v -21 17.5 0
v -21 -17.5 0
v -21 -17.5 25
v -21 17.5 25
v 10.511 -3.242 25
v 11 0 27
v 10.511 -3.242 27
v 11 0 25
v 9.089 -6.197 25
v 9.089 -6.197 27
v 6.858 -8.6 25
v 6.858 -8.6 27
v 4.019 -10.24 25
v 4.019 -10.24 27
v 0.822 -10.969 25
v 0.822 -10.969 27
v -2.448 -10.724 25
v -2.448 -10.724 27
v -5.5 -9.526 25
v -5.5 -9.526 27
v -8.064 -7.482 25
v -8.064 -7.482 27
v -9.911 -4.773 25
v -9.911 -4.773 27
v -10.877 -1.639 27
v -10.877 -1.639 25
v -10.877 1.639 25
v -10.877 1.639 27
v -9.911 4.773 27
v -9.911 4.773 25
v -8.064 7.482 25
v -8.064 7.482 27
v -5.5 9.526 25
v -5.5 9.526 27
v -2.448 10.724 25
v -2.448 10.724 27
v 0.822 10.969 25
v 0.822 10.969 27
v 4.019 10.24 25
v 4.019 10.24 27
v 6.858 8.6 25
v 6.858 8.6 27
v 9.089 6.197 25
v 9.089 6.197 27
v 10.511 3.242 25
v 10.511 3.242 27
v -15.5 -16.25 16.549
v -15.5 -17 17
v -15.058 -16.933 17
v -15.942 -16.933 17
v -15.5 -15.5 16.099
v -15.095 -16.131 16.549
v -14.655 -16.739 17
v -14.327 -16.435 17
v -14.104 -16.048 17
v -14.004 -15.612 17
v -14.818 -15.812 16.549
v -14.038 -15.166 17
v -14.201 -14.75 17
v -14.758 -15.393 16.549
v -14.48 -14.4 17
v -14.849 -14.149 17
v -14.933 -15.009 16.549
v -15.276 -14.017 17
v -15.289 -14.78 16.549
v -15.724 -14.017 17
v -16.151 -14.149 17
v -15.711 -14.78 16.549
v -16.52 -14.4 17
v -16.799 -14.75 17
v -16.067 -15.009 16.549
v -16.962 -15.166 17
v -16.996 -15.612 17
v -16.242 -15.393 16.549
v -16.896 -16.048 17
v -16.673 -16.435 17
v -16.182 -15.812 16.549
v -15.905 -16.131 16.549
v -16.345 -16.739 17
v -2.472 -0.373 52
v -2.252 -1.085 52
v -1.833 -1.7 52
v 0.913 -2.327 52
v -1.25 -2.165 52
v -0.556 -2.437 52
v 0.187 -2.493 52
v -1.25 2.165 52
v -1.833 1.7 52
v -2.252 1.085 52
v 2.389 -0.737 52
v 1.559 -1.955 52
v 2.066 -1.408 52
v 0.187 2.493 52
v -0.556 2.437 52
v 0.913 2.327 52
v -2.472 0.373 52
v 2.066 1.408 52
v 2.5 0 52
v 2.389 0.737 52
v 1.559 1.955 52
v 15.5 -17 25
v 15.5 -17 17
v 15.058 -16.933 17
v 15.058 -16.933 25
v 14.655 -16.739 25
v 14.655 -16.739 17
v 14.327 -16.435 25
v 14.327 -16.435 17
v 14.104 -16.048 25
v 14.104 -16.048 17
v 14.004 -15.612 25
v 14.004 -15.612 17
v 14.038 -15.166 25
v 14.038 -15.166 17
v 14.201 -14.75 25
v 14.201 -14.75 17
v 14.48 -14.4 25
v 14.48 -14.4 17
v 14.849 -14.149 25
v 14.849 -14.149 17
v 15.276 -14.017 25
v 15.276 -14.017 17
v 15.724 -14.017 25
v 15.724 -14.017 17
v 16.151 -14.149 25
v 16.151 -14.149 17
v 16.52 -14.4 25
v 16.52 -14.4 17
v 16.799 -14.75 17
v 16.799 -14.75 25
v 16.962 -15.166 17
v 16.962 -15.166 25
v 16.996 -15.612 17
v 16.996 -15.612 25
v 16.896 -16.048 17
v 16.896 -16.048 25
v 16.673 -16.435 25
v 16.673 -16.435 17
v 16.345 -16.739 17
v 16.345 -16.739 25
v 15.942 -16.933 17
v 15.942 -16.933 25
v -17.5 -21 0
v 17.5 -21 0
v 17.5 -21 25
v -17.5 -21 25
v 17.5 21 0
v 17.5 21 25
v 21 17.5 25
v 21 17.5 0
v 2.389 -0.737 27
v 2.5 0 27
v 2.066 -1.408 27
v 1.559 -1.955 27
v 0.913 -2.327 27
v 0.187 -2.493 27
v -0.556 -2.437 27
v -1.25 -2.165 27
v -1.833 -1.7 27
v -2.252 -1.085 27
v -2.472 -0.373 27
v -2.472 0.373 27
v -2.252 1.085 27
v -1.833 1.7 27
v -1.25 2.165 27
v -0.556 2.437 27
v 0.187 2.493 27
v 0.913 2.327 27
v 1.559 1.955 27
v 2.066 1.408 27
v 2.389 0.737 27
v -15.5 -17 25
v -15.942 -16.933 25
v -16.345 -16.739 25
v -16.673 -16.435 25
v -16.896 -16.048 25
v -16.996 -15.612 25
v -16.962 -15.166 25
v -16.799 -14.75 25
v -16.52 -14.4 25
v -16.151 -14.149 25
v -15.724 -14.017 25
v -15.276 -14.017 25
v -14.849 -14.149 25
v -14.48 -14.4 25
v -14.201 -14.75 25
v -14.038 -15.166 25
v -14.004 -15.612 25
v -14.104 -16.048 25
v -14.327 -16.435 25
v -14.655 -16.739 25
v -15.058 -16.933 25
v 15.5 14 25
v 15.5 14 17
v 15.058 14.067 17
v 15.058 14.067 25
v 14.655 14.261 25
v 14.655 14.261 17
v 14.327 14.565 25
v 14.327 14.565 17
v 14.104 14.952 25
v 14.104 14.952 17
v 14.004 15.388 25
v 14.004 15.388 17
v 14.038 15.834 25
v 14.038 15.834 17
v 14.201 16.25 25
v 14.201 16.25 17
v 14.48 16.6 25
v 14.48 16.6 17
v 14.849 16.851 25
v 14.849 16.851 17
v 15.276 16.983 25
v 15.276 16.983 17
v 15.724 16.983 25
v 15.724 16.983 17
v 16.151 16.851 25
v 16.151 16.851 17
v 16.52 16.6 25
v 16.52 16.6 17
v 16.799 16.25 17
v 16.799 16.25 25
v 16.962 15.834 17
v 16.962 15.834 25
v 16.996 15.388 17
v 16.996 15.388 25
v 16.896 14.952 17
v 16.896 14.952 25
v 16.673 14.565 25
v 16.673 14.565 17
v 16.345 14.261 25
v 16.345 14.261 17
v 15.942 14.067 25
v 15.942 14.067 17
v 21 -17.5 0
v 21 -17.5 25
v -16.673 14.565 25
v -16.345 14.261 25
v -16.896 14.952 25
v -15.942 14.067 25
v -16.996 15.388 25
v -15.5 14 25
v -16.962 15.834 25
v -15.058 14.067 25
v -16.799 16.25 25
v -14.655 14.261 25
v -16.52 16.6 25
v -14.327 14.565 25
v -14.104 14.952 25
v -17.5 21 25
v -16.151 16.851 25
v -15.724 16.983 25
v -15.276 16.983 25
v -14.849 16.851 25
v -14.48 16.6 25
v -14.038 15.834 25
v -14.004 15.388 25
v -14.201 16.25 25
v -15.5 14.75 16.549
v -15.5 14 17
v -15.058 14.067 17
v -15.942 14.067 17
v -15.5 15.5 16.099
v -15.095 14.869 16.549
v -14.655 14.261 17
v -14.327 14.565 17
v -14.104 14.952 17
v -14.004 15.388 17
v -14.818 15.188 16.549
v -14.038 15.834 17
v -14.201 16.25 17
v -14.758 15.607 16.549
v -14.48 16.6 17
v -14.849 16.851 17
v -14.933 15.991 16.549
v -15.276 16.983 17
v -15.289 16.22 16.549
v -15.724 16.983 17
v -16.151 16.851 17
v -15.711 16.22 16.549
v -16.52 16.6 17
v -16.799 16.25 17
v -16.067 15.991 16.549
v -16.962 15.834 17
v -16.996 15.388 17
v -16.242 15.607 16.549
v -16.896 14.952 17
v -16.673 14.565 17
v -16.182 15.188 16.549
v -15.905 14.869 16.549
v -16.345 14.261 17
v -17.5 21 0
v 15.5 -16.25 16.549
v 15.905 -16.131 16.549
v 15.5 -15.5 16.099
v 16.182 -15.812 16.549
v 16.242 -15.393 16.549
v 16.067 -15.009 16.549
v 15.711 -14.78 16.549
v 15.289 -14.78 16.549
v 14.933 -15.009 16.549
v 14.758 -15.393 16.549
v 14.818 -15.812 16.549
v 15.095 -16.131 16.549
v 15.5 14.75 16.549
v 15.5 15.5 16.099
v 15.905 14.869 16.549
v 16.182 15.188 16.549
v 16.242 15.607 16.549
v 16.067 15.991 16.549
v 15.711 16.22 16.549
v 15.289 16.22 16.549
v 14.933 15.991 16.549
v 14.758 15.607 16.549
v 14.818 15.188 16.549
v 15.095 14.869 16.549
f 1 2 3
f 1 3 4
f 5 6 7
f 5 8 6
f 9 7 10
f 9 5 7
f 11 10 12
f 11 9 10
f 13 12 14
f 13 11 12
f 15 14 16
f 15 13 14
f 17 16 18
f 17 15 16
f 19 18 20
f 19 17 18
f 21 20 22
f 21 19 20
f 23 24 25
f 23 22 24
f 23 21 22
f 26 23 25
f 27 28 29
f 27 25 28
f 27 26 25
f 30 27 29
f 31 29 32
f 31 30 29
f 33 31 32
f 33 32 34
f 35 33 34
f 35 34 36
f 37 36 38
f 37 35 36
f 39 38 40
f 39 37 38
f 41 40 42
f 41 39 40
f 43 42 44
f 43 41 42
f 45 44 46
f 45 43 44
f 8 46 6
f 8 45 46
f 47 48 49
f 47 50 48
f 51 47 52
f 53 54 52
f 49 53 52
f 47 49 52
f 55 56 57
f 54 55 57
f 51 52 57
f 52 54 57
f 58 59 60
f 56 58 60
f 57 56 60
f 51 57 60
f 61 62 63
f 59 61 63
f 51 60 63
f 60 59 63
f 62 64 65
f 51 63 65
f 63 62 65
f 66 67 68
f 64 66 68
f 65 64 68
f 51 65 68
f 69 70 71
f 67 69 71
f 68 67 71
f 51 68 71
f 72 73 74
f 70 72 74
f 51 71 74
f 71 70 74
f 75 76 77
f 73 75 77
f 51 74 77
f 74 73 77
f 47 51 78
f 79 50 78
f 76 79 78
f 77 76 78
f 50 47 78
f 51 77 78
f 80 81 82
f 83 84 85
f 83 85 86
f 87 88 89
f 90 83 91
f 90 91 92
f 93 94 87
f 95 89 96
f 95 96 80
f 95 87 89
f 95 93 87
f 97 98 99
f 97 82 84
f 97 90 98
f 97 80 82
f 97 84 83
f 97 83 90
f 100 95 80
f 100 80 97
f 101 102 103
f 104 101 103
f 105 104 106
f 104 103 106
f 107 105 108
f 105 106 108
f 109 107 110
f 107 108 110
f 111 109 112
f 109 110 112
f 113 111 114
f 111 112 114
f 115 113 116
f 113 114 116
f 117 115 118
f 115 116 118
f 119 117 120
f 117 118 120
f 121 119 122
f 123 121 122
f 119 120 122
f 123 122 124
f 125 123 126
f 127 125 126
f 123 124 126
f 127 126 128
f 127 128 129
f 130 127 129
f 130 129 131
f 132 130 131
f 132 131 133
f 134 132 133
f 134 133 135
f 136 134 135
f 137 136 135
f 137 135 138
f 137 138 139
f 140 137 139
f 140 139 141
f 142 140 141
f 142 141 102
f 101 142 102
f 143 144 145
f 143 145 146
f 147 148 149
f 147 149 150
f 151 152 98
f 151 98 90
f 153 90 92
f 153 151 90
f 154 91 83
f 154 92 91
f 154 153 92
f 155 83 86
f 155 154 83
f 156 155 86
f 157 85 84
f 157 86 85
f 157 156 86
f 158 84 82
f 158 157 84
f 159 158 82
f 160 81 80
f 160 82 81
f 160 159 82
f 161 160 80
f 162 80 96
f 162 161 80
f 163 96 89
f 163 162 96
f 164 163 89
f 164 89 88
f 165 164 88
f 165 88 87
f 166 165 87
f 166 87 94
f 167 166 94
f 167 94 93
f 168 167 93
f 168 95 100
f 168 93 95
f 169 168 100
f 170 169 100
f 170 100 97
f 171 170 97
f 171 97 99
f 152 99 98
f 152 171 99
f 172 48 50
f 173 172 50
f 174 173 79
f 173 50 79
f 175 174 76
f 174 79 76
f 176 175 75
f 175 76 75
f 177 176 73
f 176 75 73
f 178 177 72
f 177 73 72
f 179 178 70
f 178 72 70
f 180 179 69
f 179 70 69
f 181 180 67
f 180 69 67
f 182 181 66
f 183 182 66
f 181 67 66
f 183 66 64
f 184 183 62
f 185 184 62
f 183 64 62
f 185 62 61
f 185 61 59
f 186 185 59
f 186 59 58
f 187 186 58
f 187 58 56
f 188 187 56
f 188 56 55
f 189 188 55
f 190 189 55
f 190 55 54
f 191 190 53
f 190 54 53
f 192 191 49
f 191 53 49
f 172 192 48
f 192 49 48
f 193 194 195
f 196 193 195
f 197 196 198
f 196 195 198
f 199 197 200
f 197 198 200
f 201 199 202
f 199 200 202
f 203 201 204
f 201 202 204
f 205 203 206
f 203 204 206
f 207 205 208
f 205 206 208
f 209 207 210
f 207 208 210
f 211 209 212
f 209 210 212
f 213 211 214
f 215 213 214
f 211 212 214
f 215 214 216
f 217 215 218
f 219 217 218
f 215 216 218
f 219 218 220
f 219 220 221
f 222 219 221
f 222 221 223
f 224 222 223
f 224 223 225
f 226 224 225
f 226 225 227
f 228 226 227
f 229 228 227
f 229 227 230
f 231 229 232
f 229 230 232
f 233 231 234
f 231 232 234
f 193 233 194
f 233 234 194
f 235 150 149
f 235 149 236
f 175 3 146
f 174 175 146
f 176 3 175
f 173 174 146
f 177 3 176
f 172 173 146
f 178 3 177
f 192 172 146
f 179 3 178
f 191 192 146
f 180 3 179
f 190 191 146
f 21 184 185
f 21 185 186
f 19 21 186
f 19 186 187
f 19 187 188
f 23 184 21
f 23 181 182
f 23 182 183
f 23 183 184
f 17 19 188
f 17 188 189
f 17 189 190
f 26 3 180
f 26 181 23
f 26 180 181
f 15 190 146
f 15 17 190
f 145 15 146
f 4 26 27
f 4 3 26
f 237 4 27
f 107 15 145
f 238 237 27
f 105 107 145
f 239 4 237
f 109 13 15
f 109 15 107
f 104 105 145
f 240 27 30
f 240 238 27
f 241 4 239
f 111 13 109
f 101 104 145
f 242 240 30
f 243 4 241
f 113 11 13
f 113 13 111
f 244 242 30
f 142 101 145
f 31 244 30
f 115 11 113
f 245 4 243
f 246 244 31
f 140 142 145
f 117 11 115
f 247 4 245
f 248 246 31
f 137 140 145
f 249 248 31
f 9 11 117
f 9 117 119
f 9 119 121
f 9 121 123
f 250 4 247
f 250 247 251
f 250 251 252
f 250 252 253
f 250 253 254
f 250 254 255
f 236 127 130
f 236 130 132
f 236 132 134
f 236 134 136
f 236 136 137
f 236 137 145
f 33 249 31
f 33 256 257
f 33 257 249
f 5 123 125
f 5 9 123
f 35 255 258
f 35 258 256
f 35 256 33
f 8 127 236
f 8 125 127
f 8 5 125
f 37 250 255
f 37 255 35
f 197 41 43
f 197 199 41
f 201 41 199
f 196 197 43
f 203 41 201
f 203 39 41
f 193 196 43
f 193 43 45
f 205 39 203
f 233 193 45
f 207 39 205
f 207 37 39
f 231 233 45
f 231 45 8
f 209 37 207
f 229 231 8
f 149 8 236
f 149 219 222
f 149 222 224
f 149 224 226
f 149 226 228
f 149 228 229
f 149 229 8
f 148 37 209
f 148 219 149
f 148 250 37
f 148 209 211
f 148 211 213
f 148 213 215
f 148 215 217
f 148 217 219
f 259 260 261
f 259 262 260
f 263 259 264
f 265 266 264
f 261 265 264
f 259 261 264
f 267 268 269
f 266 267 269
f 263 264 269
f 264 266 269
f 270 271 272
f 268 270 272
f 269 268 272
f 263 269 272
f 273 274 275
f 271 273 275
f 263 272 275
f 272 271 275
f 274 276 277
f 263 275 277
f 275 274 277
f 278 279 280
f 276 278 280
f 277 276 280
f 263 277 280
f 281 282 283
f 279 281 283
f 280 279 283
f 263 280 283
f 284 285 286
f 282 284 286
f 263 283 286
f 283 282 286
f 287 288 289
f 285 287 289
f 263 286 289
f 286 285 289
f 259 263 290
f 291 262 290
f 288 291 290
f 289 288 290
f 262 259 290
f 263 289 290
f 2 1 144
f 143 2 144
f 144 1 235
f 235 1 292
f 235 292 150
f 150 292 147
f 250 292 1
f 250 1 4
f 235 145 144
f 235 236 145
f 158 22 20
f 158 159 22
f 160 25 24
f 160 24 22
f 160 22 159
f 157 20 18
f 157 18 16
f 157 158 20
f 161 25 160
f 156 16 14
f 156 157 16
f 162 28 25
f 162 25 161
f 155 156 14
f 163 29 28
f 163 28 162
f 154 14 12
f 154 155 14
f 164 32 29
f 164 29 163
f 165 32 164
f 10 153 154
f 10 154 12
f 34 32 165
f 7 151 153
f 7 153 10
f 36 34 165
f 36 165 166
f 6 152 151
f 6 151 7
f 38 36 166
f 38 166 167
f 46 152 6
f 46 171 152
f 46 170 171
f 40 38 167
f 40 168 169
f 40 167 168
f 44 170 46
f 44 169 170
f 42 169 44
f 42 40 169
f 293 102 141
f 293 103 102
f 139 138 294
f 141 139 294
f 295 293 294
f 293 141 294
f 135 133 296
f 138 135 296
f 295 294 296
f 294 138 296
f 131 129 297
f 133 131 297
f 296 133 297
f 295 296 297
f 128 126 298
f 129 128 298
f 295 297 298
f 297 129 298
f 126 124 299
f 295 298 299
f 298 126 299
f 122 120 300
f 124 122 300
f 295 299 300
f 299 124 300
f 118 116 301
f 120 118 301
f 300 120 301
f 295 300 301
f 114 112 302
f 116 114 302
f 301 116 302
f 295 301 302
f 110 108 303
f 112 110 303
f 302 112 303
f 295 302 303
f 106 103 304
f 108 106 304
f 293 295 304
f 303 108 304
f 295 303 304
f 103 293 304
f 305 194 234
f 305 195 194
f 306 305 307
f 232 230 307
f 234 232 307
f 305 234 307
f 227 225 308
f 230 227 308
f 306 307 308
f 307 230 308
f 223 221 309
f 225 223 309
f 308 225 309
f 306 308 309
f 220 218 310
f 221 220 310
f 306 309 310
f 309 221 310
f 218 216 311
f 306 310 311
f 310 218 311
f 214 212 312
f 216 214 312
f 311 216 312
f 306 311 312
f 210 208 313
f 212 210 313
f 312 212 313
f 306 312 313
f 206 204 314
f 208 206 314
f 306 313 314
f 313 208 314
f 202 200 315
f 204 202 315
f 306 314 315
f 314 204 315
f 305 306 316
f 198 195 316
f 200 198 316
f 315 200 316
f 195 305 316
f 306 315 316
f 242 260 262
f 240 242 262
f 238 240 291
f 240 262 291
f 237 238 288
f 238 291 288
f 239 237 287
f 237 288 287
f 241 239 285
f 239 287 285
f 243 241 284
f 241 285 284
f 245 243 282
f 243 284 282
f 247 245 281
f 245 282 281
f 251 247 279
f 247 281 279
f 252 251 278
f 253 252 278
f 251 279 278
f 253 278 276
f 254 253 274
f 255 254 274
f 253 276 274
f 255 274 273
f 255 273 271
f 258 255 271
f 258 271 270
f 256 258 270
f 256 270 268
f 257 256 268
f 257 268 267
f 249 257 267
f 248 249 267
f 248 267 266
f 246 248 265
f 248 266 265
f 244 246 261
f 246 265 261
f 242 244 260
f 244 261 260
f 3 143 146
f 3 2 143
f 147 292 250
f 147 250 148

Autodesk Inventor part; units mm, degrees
ref_plane "YZ Plane" through (0, 0, 0) normal (1, 0, 0) x (0, 1, 0)
ref_plane "XZ Plane" through (0, 0, 0) normal (0, 1, 0) x (-1, 0, 0)
ref_plane "XY Plane" through (0, 0, 0) normal (0, 0, 1) x (1, 0, 0)
sketch "Sketch1" plane through (0, 0, 0) normal (0, 0, 1) x (1, 0, 0)
  line L0 (21, -21) -> (-21, -21)
  line L1 (-21, -21) -> (-21, 21)
  line L2 (-21, 21) -> (21, 21)
  line L3 (21, 21) -> (21, -21)
  line L4 (21, -21) -> (-21, 21) construction
  line L5 (-21, -21) -> (21, 21) construction
  point P0 (0, 0)
  dimension "d0" = 42
extrude "Extrusion1" add sketch "Sketch1" along normal blind 25
sketch "Sketch2" plane through (0, 0, 25) normal (0, 0, 1) x (1, 0, 0)
  point P0 (0, 0)
  point P1 (-15.5, 15.5)
  point P2 (-15.5, -15.5)
  point P3 (15.5, -15.5)
  point P4 (15.5, 15.5)
  dimension "d3" = 31
  dimension "d4" = 31
  dimension "d5" = 15.5
  dimension "d6" = 15.5
hole "Hole1" at (-15.5, 15.5, 25) at (-15.5, -15.5, 25) at (15.5, -15.5, 25) at (15.5, 15.5, 25) direction (0, 0, -1) diameter 3 depth 8 tip angle 118
chamfer "Chamfer1" distance 3.5 angle 45 4 edges at (21, 21, 12.5) (21, -21, 12.5) (-21, 21, 12.5) (-21, -21, 12.5)
sketch "Sketch3" plane through (0, 0, 25) normal (0, 0, 1) x (1, 0, 0)
  circle A0 centre (0, 0) radius 11
  dimension "d17" = 22
extrude "Extrusion2" add sketch "Sketch3" along normal blind 2
sketch "Sketch4" plane through (0, 0, 27) normal (0, 0, 1) x (1, 0, 0)
  circle A0 centre (0, 0) radius 11 projected
  circle A1 centre (0, 0) radius 2.5
  dimension "d20" = 5
extrude "Extrusion3" add sketch "Sketch4" along normal blind 25 contours A1
equation "\"d4\" = d3"
equation "\"d5\" = 0.5 * d3"
equation "\"d6\" = 0.5 * d3"
properties part number "Extruder Motor" material "Steel, Alloy"
